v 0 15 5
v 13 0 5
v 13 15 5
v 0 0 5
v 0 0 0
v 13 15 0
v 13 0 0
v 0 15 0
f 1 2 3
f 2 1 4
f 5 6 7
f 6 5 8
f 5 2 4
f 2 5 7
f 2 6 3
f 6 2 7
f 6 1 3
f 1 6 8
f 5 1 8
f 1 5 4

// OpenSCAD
// Generated by SolidPython 1.0.1 on 2020-07-29 00:46:55


cube(size = [13, 15, 5]);
/***********************************************
*********      SolidPython code:      **********
************************************************
 
# import packages: SolidPython
from solid import *
from solid.utils import *
from itertools import chain, combinations, permutations


class Resize:

    def __init__(self, scad_file):
        self.scad_file = scad_file
        #self.scad_file = import_scad(scad_file)
        # cone/cylinder param:
        self.r1 = 0
        self.r2 = 0
        self.h = 0
        # rectangular prism param:
        self.w = 0
        self.l = 0
        # ellipse param:
        self.r = 0

    # import OpenScad code (file name corresponds to shape)


    # classify shape + parameters
    def assign(self, param1, param2, param3):
        if self.scad_file == 'cone.scad':
            self.r1 = param1
            self.r2 = param2
            self.h = param3
        elif self.scad_file == 'cylinder.scad':
            self.r1 = param1
            self.r2 = param2
            self.h = param3
        elif self.scad_file == 'rectangularPrism.scad':
            self.h = param1
            self.l = param2
            self.w = param3
        else:
            self.r = param1
            self.h = param2

    # resize parameters
    def iterate(self):
        x = range(3, 20, 2)
        i = 1
        if self.scad_file == 'cone.scad':
            tempList = list(permutations(x, 2))
            for temp in tempList:
                param1 = temp[0]
                param2 = temp[1]
                filepath = 'produced_scad_files/' + 'cone' + str(param1) + '_' + str(param2) + '_' + '.scad'
                scad_render_to_file(cylinder(h=param1, r1=param2, r2=0), filepath)

        elif self.scad_file == 'cylinder.scad':
            tempList = list(permutations(x, 3))
            for temp in tempList:
                param1 = temp[0]
                param2 = temp[1]
                filepath = 'produced_scad_files/' + 'cylinder' + str(param1) + '_' + str(param2) + '_' + '.scad'
                scad_render_to_file(cylinder(h=param1, r1=param2, r2=param2), filepath)

        elif self.scad_file == 'rectangularPrism.scad':
            tempList = list(permutations(x, 3))
            for temp in tempList:
                param1 = temp[0]
                param2 = temp[1]
                param3 = temp[2]
                filepath = 'produced_scad_files/' + 'rectangularPrism' + str(param1) + '_' + str(param2) + '_' + str(
                    param3) + '.scad'
                scad_render_to_file(cube(size=(param1, param2, param3)), filepath)

        elif self.scad_file == 'ellipse.scad':
            tempList = list(permutations(x, 4))
            for temp in tempList:
                param1 = temp[0]
                param2 = temp[1]
                param3 = temp[2]
                param4 = temp[3]
                filepath = 'produced_scad_files/' + 'ellipse' + str(param1) + '_' + str(param2) + '_' + str(param3) + '_' + str(param4) + '.scad'
                scad_render_to_file(scale([param1, param2, param3])(sphere(r=param4)), filepath)

    def render_to_scadfile(self):
        scad_render_to_file(scad, 'example.scad') 
 
************************************************/
